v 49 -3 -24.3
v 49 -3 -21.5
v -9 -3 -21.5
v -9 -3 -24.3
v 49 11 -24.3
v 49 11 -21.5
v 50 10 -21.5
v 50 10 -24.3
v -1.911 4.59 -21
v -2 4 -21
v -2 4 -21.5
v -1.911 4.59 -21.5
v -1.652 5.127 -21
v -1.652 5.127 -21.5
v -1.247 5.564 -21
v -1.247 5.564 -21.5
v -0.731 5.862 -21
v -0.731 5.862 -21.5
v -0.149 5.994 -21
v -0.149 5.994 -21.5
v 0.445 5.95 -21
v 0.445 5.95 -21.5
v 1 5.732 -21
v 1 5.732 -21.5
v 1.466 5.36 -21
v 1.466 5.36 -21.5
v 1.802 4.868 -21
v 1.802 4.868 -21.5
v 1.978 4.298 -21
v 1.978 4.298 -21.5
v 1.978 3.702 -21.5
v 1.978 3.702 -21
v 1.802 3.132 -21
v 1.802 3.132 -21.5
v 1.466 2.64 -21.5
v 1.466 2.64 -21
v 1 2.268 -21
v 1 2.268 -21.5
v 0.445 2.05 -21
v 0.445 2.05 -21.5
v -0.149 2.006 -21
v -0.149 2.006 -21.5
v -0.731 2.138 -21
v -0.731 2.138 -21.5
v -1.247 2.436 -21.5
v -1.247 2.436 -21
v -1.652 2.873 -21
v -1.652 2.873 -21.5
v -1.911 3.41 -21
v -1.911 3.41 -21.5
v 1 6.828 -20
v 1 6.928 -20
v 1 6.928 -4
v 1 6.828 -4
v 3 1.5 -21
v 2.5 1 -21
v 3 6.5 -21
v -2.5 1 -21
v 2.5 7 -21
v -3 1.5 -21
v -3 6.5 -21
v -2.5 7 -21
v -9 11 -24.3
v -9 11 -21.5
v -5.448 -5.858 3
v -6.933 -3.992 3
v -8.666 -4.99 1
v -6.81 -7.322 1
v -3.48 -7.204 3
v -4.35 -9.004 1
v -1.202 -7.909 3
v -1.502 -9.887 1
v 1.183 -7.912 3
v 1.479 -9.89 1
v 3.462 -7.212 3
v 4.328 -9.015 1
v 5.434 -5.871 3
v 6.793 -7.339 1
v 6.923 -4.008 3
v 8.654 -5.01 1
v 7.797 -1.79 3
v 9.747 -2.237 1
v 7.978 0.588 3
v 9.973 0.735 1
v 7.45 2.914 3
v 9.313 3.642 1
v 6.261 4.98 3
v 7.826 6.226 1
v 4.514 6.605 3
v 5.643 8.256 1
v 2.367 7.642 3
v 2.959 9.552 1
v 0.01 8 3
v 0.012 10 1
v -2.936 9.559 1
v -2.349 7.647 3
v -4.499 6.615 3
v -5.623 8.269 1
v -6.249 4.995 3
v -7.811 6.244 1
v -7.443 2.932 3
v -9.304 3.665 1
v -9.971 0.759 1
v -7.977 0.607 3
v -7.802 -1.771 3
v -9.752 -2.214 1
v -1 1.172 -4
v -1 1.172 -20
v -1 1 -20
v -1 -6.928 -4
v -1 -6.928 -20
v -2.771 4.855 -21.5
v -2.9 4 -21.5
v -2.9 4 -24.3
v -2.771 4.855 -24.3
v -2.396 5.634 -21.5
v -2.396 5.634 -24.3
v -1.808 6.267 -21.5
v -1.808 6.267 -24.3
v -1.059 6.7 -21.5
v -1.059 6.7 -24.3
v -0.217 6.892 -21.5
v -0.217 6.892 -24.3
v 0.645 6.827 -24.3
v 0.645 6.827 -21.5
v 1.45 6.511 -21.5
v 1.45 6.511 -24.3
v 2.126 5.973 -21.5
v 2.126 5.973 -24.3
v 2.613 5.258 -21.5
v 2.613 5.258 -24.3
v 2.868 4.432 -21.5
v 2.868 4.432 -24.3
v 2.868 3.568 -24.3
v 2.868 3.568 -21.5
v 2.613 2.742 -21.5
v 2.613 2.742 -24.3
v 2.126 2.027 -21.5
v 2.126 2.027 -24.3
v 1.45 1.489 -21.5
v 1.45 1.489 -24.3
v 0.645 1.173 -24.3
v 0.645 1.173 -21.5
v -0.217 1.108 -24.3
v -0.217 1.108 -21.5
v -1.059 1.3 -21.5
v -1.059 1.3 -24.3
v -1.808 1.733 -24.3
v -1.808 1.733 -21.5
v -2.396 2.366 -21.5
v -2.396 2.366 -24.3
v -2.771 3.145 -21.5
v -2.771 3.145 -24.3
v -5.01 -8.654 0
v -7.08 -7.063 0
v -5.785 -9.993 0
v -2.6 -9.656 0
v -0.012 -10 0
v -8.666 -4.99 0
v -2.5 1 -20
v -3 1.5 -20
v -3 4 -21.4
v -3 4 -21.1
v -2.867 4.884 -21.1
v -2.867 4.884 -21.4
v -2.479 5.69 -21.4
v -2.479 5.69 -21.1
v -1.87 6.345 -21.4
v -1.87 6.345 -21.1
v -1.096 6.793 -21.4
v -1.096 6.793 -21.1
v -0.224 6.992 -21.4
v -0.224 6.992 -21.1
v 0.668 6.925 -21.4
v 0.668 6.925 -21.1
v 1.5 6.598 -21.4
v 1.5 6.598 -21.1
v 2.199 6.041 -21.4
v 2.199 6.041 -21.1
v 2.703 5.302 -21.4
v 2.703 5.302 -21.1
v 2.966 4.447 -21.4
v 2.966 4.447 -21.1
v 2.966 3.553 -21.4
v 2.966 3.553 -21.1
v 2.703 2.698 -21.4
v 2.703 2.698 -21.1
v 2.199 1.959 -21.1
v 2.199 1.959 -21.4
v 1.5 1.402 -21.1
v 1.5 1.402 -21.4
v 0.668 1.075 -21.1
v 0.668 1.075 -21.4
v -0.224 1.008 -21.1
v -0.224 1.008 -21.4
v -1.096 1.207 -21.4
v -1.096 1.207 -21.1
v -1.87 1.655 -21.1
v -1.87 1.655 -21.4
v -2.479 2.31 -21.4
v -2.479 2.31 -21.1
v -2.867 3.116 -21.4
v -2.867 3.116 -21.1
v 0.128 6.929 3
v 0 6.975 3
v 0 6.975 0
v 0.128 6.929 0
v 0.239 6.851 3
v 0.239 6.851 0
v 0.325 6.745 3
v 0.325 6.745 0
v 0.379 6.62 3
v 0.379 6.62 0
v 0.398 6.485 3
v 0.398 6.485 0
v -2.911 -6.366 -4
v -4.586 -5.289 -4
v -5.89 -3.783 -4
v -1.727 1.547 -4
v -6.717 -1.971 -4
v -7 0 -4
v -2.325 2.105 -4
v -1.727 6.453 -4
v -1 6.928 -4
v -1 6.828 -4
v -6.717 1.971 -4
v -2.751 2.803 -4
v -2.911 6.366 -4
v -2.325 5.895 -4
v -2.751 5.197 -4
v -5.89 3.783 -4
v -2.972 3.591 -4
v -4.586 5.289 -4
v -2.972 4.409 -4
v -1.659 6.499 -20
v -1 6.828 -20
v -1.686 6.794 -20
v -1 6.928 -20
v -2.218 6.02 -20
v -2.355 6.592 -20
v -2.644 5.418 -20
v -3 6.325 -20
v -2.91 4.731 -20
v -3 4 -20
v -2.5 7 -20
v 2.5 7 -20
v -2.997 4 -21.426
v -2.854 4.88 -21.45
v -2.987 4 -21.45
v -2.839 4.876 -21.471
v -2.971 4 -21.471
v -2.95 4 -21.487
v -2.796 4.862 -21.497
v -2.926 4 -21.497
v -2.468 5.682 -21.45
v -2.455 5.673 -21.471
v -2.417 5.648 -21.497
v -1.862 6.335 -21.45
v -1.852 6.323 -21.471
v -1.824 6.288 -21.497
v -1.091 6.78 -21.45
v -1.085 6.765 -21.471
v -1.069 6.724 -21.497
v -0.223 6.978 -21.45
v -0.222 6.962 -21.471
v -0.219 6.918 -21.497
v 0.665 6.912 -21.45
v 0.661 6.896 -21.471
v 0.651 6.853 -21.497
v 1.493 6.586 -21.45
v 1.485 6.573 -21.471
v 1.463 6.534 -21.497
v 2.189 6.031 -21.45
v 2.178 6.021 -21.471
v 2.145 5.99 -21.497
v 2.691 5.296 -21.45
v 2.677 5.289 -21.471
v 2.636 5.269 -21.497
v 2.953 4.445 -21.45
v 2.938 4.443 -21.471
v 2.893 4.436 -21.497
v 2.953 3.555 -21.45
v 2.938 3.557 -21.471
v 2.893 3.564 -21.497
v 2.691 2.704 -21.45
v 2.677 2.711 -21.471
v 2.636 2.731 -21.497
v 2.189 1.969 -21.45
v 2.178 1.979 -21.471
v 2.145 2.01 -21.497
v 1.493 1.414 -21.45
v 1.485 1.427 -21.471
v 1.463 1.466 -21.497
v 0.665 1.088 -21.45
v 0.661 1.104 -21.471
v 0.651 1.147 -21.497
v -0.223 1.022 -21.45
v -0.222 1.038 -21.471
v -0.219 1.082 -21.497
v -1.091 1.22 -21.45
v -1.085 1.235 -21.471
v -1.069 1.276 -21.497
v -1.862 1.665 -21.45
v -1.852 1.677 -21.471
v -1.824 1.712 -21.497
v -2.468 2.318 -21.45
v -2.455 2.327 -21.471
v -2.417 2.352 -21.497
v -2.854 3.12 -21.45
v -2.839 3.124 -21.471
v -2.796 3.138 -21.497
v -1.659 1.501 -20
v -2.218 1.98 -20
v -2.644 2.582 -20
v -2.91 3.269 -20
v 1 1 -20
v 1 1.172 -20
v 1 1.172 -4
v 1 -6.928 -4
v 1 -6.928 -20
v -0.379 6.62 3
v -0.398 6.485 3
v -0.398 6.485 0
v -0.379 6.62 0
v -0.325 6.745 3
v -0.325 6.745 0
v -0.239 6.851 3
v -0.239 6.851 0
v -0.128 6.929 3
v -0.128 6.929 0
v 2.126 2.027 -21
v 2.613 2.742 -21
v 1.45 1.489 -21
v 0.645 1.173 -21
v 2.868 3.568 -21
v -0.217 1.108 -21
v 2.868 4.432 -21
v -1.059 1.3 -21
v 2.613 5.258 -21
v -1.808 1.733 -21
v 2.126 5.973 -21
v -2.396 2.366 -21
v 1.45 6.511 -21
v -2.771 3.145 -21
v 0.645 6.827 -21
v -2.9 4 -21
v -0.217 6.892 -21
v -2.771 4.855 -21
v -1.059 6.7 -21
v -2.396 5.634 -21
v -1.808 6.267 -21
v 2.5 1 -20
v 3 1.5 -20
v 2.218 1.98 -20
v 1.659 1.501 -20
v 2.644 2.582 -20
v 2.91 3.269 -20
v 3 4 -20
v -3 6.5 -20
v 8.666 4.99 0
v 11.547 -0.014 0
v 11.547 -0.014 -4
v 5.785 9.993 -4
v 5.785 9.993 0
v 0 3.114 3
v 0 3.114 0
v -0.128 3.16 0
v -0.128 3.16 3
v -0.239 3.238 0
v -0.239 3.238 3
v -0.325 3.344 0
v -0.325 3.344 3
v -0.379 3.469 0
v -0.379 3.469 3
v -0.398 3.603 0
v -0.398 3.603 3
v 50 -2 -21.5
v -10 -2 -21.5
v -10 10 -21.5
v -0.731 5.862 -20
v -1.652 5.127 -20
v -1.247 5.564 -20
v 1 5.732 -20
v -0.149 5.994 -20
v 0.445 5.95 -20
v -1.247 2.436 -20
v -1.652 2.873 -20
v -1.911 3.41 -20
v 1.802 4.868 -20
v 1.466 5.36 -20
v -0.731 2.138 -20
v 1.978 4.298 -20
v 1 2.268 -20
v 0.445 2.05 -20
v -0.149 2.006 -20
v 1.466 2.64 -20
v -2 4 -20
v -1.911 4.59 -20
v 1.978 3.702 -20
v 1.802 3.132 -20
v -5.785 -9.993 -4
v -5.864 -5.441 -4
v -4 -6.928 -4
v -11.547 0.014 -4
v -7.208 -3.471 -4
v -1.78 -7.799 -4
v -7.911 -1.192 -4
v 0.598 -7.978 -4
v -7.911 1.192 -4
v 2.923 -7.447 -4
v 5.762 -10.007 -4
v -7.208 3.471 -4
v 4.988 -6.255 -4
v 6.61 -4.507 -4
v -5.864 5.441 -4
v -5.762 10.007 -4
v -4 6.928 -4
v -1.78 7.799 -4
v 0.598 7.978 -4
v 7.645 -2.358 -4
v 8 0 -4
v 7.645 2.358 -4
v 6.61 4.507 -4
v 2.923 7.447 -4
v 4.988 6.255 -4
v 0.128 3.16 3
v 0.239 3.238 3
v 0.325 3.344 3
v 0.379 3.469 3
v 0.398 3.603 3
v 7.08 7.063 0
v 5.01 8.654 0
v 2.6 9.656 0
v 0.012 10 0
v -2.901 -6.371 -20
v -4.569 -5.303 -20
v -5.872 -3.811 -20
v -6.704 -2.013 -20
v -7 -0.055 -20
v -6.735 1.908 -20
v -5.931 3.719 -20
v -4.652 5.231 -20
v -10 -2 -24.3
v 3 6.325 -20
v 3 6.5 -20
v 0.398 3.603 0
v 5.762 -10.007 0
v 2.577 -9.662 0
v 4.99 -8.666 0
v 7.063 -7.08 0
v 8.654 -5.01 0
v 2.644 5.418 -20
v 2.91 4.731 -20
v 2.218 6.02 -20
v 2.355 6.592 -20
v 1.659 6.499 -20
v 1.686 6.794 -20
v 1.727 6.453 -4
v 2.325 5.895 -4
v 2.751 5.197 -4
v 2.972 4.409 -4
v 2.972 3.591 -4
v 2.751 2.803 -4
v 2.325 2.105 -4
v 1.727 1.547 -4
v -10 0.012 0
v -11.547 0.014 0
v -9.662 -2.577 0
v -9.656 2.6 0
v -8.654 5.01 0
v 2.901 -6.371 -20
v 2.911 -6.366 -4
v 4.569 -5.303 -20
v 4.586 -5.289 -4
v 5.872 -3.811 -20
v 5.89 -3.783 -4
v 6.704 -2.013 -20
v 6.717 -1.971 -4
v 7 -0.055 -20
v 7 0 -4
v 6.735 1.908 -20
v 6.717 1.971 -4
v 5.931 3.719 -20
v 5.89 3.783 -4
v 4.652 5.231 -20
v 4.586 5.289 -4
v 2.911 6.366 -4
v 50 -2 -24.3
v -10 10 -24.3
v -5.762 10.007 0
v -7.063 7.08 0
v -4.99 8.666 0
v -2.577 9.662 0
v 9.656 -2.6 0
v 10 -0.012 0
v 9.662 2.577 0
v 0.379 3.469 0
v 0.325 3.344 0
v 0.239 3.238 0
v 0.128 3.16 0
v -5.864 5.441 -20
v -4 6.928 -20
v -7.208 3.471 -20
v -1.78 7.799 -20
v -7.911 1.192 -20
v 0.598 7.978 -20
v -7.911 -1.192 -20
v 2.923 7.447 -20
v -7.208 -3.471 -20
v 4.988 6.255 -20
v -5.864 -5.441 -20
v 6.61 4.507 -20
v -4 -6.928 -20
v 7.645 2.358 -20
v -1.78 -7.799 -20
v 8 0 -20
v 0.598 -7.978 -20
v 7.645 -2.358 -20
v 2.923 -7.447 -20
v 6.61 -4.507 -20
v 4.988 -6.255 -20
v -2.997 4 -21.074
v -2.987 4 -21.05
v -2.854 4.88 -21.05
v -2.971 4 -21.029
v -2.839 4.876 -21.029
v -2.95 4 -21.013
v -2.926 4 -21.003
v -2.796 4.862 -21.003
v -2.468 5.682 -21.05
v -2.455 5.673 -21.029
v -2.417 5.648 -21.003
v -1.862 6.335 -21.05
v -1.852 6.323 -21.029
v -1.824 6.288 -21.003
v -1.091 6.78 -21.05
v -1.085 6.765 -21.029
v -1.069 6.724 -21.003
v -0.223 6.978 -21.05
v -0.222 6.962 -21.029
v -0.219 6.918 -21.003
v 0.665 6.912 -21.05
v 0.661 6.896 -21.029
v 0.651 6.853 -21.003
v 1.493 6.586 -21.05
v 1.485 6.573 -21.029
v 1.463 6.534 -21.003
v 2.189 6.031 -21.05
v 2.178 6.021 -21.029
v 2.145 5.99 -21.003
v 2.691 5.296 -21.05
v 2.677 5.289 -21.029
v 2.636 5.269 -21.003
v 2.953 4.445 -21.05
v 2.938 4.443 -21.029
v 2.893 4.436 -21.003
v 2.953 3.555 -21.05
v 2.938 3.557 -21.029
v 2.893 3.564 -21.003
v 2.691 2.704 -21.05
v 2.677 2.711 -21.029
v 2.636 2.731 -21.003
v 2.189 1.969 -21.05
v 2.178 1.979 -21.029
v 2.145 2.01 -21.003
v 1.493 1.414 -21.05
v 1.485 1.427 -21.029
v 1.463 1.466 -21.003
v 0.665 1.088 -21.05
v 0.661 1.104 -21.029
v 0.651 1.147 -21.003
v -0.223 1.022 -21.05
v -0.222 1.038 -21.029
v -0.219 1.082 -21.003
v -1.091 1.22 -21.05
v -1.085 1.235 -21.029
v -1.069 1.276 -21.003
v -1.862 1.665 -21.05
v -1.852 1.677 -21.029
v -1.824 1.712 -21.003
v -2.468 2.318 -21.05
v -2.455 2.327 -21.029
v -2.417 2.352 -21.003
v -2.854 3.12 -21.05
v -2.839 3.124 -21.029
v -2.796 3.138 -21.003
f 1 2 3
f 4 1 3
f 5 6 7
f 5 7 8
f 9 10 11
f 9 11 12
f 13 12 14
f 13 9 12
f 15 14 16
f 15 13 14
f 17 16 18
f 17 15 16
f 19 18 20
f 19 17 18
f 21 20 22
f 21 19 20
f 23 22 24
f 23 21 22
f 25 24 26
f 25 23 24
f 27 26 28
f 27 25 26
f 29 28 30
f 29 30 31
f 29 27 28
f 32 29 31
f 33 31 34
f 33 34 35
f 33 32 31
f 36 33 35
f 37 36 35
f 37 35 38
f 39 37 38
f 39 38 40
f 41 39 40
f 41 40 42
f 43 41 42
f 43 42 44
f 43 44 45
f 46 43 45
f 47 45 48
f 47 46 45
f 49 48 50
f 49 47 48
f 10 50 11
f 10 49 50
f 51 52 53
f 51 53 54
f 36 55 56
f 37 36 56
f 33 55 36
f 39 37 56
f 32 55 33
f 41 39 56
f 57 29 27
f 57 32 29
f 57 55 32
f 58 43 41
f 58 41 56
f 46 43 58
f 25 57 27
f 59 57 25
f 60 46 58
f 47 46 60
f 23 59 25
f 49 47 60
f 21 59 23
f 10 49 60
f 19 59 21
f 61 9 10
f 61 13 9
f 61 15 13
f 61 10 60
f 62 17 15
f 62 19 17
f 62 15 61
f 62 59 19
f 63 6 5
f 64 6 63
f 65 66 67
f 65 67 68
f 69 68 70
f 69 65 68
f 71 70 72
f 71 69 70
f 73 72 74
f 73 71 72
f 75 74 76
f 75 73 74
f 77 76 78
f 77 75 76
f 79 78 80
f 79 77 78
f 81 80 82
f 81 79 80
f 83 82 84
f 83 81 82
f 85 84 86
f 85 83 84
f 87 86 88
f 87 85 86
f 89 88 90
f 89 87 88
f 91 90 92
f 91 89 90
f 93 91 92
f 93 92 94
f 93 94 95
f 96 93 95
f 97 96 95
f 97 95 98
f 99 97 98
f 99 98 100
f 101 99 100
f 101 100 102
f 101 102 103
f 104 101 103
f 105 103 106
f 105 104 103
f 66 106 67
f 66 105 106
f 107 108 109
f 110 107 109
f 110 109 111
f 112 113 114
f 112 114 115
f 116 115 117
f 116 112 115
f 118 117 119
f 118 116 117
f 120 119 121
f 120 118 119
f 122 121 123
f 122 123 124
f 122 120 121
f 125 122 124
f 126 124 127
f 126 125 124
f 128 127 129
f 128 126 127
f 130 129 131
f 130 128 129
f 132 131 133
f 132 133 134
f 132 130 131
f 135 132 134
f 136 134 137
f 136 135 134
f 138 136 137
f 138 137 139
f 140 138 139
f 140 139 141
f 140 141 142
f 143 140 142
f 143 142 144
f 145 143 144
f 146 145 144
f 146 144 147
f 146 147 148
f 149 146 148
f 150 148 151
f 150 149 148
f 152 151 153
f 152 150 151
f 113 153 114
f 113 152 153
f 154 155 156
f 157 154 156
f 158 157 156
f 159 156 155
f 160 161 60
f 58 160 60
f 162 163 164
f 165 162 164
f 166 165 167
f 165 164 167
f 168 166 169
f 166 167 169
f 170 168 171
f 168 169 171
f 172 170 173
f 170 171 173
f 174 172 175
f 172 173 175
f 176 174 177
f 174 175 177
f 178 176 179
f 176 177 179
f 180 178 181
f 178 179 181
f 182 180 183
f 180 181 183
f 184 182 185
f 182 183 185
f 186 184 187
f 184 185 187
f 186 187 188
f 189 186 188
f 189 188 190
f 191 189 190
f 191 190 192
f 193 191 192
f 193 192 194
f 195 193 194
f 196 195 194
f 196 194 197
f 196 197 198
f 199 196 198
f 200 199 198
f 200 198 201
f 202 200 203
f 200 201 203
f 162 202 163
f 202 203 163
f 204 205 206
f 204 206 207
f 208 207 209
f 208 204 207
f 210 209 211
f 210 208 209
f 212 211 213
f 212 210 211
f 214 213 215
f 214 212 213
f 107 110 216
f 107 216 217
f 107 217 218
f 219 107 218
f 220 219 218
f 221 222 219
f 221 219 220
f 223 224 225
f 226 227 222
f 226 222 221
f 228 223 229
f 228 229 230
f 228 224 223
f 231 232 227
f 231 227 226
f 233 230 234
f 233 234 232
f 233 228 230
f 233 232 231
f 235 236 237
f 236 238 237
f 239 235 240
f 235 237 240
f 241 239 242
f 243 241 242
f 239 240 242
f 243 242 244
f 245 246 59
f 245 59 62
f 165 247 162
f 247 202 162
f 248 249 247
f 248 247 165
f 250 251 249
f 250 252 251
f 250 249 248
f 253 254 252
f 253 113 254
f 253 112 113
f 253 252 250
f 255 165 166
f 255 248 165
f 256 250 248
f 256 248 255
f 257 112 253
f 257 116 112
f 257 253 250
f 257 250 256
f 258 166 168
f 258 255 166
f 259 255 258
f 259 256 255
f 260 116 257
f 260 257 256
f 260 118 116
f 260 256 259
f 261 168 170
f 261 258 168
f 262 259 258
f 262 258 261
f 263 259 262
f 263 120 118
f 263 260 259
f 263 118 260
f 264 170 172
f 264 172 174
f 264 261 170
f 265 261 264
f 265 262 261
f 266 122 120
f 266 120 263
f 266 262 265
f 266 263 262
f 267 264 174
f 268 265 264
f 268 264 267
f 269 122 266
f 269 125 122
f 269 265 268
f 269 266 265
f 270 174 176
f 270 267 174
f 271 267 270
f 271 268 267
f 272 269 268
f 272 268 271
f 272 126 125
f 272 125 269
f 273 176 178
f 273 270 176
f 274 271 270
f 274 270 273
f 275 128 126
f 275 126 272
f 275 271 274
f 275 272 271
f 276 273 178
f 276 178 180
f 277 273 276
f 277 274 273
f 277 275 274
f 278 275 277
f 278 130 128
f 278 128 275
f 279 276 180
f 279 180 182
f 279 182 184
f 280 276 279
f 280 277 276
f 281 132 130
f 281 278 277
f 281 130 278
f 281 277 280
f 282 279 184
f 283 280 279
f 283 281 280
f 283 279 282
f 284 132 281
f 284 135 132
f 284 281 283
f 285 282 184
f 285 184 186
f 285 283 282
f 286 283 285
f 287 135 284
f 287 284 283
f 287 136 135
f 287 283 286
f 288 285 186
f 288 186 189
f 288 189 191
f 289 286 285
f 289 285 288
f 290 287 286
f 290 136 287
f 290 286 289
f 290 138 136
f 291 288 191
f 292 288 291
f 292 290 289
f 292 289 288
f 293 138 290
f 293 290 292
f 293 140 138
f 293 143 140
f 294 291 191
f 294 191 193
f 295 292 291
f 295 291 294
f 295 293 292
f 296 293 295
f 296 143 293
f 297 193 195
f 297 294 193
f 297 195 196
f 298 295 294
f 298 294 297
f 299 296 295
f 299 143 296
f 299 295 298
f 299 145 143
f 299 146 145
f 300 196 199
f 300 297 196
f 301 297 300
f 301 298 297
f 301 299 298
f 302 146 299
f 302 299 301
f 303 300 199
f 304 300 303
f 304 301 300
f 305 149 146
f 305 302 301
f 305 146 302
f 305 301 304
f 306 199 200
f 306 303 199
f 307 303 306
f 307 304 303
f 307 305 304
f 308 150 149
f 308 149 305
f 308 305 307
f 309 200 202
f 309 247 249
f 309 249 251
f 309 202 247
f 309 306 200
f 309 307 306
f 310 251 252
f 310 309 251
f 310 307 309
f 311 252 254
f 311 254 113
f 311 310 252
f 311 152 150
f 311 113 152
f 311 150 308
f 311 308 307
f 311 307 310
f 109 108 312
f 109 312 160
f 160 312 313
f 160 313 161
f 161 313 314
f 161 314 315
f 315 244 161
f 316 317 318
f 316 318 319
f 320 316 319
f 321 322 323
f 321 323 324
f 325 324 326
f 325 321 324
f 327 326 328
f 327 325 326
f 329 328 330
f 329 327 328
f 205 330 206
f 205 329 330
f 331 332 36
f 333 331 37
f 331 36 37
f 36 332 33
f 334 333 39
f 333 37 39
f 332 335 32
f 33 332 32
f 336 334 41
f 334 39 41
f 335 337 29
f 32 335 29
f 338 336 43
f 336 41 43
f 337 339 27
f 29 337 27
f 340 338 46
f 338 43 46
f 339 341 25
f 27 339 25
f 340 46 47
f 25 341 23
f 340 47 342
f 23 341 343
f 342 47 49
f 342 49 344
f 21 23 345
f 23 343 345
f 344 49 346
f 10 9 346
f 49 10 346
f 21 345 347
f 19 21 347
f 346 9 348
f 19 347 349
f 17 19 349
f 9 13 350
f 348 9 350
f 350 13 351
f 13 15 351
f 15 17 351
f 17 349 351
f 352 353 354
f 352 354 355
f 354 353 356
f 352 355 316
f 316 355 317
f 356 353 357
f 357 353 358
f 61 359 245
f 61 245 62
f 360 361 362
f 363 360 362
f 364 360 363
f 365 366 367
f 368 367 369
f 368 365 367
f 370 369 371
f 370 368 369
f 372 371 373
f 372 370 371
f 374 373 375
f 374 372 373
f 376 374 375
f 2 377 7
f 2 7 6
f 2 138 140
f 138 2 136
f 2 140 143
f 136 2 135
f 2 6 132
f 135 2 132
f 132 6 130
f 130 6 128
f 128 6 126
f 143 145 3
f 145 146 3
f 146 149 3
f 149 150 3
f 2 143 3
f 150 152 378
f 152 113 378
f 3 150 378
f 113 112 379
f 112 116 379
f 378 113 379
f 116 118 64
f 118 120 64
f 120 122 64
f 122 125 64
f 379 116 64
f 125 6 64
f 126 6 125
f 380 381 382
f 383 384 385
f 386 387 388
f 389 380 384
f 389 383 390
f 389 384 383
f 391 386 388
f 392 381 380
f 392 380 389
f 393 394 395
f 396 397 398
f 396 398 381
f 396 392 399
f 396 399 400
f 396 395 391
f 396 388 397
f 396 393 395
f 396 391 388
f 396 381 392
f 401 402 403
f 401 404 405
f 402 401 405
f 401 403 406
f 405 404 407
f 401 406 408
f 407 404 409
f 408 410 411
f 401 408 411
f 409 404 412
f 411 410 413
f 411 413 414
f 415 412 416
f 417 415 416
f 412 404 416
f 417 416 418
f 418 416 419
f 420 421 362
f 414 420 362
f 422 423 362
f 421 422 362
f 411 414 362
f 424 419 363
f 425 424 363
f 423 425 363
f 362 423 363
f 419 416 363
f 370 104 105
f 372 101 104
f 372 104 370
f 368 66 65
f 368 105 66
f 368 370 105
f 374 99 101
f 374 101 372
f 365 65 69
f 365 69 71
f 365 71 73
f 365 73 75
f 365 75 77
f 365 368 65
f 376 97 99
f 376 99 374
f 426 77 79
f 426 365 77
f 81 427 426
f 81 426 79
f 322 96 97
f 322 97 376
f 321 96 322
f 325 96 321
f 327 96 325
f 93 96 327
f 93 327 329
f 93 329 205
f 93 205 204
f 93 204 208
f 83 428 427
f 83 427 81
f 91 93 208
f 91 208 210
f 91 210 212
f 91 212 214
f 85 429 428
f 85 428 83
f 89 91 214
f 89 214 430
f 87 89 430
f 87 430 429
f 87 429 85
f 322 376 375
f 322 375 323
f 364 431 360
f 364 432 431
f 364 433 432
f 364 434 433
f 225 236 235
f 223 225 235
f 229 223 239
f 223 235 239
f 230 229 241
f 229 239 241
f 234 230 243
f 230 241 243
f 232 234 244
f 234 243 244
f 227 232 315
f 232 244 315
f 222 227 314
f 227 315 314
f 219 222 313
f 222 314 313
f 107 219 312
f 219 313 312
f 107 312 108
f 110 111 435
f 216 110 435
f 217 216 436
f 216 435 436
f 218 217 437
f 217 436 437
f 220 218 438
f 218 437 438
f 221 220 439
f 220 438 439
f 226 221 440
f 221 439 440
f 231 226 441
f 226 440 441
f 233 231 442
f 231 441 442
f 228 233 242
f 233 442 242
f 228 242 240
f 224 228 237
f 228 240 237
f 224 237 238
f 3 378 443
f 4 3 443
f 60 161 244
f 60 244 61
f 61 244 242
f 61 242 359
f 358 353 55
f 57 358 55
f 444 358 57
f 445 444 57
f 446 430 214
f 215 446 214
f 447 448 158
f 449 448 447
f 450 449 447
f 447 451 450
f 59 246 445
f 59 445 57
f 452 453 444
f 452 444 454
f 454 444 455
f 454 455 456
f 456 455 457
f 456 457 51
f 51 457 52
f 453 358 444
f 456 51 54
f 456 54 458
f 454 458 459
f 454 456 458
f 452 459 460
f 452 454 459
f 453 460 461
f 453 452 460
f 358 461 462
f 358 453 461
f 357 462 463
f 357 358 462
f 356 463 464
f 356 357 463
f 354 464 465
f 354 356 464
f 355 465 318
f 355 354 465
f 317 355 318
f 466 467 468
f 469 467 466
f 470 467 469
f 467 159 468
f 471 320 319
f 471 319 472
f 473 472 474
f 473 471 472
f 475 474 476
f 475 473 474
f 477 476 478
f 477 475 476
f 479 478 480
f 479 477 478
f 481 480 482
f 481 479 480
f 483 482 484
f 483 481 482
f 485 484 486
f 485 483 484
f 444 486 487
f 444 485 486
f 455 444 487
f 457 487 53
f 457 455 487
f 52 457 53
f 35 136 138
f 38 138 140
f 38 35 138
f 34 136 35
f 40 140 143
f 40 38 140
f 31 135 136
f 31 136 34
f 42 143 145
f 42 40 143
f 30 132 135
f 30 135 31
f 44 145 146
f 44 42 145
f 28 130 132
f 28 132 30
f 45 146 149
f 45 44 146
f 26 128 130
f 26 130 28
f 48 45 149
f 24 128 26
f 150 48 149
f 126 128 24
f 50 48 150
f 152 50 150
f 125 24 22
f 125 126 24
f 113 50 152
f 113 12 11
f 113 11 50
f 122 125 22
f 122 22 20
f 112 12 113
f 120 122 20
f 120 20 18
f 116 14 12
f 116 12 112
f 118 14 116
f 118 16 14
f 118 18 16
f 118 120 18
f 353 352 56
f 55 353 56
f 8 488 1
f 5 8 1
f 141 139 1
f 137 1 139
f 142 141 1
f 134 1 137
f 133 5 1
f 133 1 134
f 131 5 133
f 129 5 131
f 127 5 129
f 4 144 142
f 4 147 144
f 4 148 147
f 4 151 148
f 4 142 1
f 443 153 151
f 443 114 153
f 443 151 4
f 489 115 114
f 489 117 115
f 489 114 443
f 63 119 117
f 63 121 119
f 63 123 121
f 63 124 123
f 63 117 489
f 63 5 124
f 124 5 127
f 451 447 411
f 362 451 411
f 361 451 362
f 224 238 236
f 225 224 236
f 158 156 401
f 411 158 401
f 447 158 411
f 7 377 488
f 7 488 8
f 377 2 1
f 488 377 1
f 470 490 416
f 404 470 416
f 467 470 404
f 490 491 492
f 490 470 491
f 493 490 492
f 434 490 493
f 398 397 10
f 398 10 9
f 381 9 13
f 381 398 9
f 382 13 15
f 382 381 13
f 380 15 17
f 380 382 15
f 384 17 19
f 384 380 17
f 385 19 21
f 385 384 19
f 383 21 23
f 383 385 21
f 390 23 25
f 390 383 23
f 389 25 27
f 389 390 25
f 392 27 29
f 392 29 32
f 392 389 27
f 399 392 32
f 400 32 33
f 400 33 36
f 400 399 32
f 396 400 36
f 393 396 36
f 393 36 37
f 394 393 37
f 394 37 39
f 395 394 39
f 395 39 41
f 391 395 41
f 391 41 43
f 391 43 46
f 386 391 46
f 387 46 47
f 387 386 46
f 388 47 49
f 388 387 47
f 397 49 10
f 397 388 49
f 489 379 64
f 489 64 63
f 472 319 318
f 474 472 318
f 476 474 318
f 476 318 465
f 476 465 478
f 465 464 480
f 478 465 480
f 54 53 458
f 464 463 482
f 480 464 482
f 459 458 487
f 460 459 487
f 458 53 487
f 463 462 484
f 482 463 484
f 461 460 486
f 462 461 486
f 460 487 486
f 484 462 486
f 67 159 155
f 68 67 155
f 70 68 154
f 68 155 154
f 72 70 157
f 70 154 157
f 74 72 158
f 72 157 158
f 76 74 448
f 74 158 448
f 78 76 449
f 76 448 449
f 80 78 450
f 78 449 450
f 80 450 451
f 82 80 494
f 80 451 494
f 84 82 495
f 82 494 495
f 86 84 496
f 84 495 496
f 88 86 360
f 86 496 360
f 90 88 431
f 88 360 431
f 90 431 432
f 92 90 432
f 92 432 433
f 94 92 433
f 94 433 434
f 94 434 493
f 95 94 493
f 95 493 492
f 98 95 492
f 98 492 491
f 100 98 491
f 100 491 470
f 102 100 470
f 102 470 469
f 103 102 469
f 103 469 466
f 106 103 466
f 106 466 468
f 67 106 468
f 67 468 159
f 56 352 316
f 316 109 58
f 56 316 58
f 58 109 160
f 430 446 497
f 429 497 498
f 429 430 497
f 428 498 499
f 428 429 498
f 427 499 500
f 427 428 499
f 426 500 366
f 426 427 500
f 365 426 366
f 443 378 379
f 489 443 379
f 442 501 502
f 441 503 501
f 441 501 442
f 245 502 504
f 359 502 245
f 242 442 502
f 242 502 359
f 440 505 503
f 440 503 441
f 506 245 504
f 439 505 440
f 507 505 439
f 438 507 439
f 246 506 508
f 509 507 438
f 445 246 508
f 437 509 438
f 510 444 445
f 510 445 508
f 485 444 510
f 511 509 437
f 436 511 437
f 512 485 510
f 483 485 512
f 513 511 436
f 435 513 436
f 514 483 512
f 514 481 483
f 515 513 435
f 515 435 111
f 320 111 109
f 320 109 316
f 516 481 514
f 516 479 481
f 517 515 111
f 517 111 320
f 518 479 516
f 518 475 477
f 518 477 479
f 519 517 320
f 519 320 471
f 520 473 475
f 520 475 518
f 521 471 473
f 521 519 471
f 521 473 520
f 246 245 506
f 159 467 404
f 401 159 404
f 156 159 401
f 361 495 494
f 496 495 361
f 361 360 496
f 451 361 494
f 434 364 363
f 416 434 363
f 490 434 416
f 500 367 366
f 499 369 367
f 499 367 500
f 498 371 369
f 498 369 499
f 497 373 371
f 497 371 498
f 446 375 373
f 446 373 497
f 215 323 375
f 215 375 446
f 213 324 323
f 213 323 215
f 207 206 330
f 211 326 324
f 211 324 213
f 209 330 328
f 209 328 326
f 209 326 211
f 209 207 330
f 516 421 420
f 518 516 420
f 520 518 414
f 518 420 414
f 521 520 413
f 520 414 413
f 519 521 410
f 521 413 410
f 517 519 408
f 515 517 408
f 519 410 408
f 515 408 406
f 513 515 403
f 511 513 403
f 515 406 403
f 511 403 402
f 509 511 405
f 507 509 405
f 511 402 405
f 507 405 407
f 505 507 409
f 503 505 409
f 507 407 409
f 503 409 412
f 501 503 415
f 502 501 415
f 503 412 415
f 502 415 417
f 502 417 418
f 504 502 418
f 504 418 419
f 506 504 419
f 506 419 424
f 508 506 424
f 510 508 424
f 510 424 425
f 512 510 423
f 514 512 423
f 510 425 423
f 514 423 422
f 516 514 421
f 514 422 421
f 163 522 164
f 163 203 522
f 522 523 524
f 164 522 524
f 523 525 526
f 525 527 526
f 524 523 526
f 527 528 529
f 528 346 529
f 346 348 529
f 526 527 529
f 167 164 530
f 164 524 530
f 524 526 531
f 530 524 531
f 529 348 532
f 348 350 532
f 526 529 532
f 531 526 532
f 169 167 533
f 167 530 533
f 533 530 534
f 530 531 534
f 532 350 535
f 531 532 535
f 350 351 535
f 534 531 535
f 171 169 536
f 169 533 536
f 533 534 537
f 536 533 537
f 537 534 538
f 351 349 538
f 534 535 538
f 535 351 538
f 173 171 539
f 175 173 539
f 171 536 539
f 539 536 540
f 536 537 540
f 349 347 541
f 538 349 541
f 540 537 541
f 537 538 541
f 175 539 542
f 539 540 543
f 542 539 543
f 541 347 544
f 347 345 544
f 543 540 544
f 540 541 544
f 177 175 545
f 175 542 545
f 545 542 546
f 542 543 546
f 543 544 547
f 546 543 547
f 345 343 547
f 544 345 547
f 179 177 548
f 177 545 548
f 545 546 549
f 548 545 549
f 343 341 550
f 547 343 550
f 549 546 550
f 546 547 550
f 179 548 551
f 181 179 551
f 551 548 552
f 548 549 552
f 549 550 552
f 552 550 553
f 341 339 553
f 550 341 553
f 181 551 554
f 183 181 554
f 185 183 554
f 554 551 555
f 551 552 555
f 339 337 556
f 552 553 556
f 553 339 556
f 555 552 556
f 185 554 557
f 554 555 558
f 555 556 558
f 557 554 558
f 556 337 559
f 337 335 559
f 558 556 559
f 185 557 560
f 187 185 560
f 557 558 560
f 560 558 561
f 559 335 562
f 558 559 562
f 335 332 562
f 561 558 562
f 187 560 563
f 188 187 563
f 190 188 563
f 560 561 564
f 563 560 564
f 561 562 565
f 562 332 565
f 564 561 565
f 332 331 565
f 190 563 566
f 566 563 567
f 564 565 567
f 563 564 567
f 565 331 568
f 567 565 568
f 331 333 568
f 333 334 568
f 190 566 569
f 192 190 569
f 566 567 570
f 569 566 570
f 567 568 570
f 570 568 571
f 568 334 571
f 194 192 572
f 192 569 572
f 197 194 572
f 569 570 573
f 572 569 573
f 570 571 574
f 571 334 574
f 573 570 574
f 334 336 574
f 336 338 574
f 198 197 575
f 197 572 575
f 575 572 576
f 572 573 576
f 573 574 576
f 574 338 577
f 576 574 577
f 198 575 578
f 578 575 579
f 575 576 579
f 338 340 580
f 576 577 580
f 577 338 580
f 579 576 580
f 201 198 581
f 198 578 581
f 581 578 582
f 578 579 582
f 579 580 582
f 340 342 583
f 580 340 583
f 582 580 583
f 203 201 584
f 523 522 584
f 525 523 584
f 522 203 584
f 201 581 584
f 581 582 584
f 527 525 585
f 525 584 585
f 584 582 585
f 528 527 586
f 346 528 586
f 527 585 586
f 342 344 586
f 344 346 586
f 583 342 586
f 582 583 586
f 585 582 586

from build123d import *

# Parameters (mm, degrees)
BOSS_EXTRUDE1_DEPTH     = 4
SKETCH2_R               = 8
BOSS_EXTRUDE2_DEPTH     = 16
CUT_EXTRUDE1_DEPTH      = 16
SKETCH5_R               = 10
BOSS_EXTRUDE4_DEPTH     = 3
CHAMFER2_SIZE           = 2
SKETCH6_W               = 0.795923982
SKETCH6_H               = 3.882038779
CUT_EXTRUDE2_DEPTH      = 3
FILLET2_R               = 0.5
SKETCH9_W               = 6
SKETCH9_H               = 6
SKETCH9_R               = 2
BOSS_EXTRUDE6_DEPTH     = 1
CHAMFER3_SIZE           = 0.5
SKETCH10_R              = 3
SKETCH10_R_2            = 2
BOSS_EXTRUDE7_DEPTH     = 0.5
FILLET3_R               = 0.1
BOSS_EXTRUDE8_OUTLINE_W = 60
BOSS_EXTRUDE8_OUTLINE_H = 14
BOSS_EXTRUDE8_OUTLINE_R = 2.9
BOSS_EXTRUDE8_DEPTH     = 2.8
CHAMFER4_SIZE           = 1


# Read off the part's stored shape, not the designer's step: Boss-Extrude8
with BuildPart() as part:
    # Sketch1 → Boss-Extrude1 (new body)
    with BuildSketch(Plane.XY):
        Polygon((5.785468513, 9.993081978), (-5.761528598, 10.006903694), (-11.546997112, 0.013821717), (-5.785468513, -9.993081978), (5.761528598, -10.006903694), (11.546997112, -0.013821717), align=None)
    extrude(amount=-BOSS_EXTRUDE1_DEPTH)

    # Sketch2 → Boss-Extrude2 (add)
    with BuildSketch(Plane(origin=(0, 0, -4), x_dir=(-1, 0, 0), z_dir=(0, 0, -1))):
        with Locations(Location((0, 0, 0), (0, 0, 180))):
            Circle(SKETCH2_R)
    extrude(amount=BOSS_EXTRUDE2_DEPTH)

    # Sketch3 → Cut-Extrude1 (cut)
    with BuildSketch(Plane(origin=(0, 0, -20), x_dir=(-1, 0, 0), z_dir=(0, 0, -1))):
        with BuildLine():
            Line((-1, 1.171572875), (-1, -6.92820323))
            ThreePointArc((-1, -6.92820323), (-7, 0), (-1, 6.92820323))
            Line((-1, 6.92820323), (-1, 6.828427125))
            ThreePointArc((-1, 6.828427125), (-3, 4), (-1, 1.171572875))
        make_face()
        with BuildLine():
            Line((1, 1.171572875), (1, -6.92820323))
            ThreePointArc((1, -6.92820323), (7, 0), (1, 6.92820323))
            Line((1, 6.92820323), (1, 6.828427125))
            ThreePointArc((1, 6.828427125), (3, 4), (1, 1.171572875))
        make_face()
    extrude(amount=-CUT_EXTRUDE1_DEPTH, mode=Mode.SUBTRACT)

    # Sketch5 → Boss-Extrude4 (add)
    with BuildSketch(Plane.XY):
        with Locations(Location((0, 0, 0), (0, 0, 209.931417178))):
            Circle(SKETCH5_R)
    extrude(amount=BOSS_EXTRUDE4_DEPTH)

    # Chamfer2
    chamfer2_edges = [part.edges().sort_by_distance(p)[0] for p in [
        (8.666232812, 4.989630131, 3),
    ]]
    chamfer(chamfer2_edges, length=CHAMFER2_SIZE)

    # Sketch6 → Cut-Extrude2 (cut)
    with BuildSketch(Plane.XY.offset(3)):
        with Locations((0, 5.044443369)):
            Rectangle(SKETCH6_W, SKETCH6_H)
    extrude(amount=-CUT_EXTRUDE2_DEPTH, mode=Mode.SUBTRACT)

    # Fillet2
    # the kernel refuses this fillet: 0.5 mm, written as the material it adds along each edge
    with BuildSketch(Plane(origin=(0.397961991, 3.103423979, 3), x_dir=(-1, 0, 0), z_dir=(0, 0, -1)), Plane(origin=(0.397961991, 6.985462758, 3), x_dir=(0, -1, 0), z_dir=(0, 0, -1)), Plane(origin=(-0.397961991, 6.985462758, 3), x_dir=(1, 0, 0), z_dir=(0, 0, -1))) as fillet2_piece_1:
        with BuildLine():
            CenterArc((FILLET2_R, FILLET2_R), FILLET2_R, 180, 90)
            Line((0, FILLET2_R), (0, 0))
            Line((0, 0), (FILLET2_R, 0))
        make_face()
    extrude(amount=4.25)
    with BuildSketch(Plane(origin=(-0.397961991, 3.103423979, 3), x_dir=(1, 0, 0), z_dir=(0, 0, -1))) as fillet2_piece_2:
        with BuildLine():
            CenterArc((FILLET2_R, -FILLET2_R), FILLET2_R, 90, 90)
            Line((0, -FILLET2_R), (0, 0))
            Line((0, 0), (FILLET2_R, 0))
        make_face()
    extrude(amount=4.25)

    # Sketch9 → Boss-Extrude6 (add)
    with BuildSketch(Plane(origin=(0, 0, -20), x_dir=(-1, 0, 0), z_dir=(0, 0, -1))):
        with Locations((0, 4)):
            Rectangle(SKETCH9_W, SKETCH9_H)
        with Locations((0, 4)):
            Circle(SKETCH9_R, mode=Mode.SUBTRACT)
    extrude(amount=BOSS_EXTRUDE6_DEPTH)

    # Chamfer3
    chamfer3_edges = [part.edges().sort_by_distance(p)[0] for p in [
        (-3, 1, -20.5),
        (-3, 7, -20.5),
        (3, 7, -20.5),
        (3, 1, -20.5),
    ]]
    chamfer(chamfer3_edges, length=CHAMFER3_SIZE)


with BuildPart() as body_2:
    # Sketch10 → Boss-Extrude7 (new body)
    with BuildSketch(Plane(origin=(0, 0, -21), x_dir=(-1, 0, 0), z_dir=(0, 0, -1))):
        with Locations((0, 4)):
            Circle(SKETCH10_R)
        with Locations((0, 4)):
            Circle(SKETCH10_R_2, mode=Mode.SUBTRACT)
    extrude(amount=BOSS_EXTRUDE7_DEPTH)

    # Fillet3
    fillet3_edges = [body_2.edges().sort_by_distance(p)[0] for p in [
        (3, 4, -21),
        (3, 4, -21.5),
    ]]
    fillet(fillet3_edges, radius=FILLET3_R)


with BuildPart() as body_3:
    # Boss-Extrude8 outline → Boss-Extrude8 (new body)
    with BuildSketch(Plane(origin=(0, 0, -21.5), x_dir=(-1, 0, 0), z_dir=(0, 0, -1))):
        with Locations((-20, 4)):
            Rectangle(BOSS_EXTRUDE8_OUTLINE_W, BOSS_EXTRUDE8_OUTLINE_H)
        with Locations((0, 4)):
            Circle(BOSS_EXTRUDE8_OUTLINE_R, mode=Mode.SUBTRACT)
    extrude(amount=BOSS_EXTRUDE8_DEPTH)

    # Chamfer4
    chamfer4_edges = [body_3.edges().sort_by_distance(p)[0] for p in [
        (-10, -3, -22.9),
        (50, -3, -22.9),
        (50, 11, -22.9),
        (-10, 11, -22.9),
    ]]
    chamfer(chamfer4_edges, length=CHAMFER4_SIZE)


solid = Compound([part.part, body_2.part, body_3.part])
